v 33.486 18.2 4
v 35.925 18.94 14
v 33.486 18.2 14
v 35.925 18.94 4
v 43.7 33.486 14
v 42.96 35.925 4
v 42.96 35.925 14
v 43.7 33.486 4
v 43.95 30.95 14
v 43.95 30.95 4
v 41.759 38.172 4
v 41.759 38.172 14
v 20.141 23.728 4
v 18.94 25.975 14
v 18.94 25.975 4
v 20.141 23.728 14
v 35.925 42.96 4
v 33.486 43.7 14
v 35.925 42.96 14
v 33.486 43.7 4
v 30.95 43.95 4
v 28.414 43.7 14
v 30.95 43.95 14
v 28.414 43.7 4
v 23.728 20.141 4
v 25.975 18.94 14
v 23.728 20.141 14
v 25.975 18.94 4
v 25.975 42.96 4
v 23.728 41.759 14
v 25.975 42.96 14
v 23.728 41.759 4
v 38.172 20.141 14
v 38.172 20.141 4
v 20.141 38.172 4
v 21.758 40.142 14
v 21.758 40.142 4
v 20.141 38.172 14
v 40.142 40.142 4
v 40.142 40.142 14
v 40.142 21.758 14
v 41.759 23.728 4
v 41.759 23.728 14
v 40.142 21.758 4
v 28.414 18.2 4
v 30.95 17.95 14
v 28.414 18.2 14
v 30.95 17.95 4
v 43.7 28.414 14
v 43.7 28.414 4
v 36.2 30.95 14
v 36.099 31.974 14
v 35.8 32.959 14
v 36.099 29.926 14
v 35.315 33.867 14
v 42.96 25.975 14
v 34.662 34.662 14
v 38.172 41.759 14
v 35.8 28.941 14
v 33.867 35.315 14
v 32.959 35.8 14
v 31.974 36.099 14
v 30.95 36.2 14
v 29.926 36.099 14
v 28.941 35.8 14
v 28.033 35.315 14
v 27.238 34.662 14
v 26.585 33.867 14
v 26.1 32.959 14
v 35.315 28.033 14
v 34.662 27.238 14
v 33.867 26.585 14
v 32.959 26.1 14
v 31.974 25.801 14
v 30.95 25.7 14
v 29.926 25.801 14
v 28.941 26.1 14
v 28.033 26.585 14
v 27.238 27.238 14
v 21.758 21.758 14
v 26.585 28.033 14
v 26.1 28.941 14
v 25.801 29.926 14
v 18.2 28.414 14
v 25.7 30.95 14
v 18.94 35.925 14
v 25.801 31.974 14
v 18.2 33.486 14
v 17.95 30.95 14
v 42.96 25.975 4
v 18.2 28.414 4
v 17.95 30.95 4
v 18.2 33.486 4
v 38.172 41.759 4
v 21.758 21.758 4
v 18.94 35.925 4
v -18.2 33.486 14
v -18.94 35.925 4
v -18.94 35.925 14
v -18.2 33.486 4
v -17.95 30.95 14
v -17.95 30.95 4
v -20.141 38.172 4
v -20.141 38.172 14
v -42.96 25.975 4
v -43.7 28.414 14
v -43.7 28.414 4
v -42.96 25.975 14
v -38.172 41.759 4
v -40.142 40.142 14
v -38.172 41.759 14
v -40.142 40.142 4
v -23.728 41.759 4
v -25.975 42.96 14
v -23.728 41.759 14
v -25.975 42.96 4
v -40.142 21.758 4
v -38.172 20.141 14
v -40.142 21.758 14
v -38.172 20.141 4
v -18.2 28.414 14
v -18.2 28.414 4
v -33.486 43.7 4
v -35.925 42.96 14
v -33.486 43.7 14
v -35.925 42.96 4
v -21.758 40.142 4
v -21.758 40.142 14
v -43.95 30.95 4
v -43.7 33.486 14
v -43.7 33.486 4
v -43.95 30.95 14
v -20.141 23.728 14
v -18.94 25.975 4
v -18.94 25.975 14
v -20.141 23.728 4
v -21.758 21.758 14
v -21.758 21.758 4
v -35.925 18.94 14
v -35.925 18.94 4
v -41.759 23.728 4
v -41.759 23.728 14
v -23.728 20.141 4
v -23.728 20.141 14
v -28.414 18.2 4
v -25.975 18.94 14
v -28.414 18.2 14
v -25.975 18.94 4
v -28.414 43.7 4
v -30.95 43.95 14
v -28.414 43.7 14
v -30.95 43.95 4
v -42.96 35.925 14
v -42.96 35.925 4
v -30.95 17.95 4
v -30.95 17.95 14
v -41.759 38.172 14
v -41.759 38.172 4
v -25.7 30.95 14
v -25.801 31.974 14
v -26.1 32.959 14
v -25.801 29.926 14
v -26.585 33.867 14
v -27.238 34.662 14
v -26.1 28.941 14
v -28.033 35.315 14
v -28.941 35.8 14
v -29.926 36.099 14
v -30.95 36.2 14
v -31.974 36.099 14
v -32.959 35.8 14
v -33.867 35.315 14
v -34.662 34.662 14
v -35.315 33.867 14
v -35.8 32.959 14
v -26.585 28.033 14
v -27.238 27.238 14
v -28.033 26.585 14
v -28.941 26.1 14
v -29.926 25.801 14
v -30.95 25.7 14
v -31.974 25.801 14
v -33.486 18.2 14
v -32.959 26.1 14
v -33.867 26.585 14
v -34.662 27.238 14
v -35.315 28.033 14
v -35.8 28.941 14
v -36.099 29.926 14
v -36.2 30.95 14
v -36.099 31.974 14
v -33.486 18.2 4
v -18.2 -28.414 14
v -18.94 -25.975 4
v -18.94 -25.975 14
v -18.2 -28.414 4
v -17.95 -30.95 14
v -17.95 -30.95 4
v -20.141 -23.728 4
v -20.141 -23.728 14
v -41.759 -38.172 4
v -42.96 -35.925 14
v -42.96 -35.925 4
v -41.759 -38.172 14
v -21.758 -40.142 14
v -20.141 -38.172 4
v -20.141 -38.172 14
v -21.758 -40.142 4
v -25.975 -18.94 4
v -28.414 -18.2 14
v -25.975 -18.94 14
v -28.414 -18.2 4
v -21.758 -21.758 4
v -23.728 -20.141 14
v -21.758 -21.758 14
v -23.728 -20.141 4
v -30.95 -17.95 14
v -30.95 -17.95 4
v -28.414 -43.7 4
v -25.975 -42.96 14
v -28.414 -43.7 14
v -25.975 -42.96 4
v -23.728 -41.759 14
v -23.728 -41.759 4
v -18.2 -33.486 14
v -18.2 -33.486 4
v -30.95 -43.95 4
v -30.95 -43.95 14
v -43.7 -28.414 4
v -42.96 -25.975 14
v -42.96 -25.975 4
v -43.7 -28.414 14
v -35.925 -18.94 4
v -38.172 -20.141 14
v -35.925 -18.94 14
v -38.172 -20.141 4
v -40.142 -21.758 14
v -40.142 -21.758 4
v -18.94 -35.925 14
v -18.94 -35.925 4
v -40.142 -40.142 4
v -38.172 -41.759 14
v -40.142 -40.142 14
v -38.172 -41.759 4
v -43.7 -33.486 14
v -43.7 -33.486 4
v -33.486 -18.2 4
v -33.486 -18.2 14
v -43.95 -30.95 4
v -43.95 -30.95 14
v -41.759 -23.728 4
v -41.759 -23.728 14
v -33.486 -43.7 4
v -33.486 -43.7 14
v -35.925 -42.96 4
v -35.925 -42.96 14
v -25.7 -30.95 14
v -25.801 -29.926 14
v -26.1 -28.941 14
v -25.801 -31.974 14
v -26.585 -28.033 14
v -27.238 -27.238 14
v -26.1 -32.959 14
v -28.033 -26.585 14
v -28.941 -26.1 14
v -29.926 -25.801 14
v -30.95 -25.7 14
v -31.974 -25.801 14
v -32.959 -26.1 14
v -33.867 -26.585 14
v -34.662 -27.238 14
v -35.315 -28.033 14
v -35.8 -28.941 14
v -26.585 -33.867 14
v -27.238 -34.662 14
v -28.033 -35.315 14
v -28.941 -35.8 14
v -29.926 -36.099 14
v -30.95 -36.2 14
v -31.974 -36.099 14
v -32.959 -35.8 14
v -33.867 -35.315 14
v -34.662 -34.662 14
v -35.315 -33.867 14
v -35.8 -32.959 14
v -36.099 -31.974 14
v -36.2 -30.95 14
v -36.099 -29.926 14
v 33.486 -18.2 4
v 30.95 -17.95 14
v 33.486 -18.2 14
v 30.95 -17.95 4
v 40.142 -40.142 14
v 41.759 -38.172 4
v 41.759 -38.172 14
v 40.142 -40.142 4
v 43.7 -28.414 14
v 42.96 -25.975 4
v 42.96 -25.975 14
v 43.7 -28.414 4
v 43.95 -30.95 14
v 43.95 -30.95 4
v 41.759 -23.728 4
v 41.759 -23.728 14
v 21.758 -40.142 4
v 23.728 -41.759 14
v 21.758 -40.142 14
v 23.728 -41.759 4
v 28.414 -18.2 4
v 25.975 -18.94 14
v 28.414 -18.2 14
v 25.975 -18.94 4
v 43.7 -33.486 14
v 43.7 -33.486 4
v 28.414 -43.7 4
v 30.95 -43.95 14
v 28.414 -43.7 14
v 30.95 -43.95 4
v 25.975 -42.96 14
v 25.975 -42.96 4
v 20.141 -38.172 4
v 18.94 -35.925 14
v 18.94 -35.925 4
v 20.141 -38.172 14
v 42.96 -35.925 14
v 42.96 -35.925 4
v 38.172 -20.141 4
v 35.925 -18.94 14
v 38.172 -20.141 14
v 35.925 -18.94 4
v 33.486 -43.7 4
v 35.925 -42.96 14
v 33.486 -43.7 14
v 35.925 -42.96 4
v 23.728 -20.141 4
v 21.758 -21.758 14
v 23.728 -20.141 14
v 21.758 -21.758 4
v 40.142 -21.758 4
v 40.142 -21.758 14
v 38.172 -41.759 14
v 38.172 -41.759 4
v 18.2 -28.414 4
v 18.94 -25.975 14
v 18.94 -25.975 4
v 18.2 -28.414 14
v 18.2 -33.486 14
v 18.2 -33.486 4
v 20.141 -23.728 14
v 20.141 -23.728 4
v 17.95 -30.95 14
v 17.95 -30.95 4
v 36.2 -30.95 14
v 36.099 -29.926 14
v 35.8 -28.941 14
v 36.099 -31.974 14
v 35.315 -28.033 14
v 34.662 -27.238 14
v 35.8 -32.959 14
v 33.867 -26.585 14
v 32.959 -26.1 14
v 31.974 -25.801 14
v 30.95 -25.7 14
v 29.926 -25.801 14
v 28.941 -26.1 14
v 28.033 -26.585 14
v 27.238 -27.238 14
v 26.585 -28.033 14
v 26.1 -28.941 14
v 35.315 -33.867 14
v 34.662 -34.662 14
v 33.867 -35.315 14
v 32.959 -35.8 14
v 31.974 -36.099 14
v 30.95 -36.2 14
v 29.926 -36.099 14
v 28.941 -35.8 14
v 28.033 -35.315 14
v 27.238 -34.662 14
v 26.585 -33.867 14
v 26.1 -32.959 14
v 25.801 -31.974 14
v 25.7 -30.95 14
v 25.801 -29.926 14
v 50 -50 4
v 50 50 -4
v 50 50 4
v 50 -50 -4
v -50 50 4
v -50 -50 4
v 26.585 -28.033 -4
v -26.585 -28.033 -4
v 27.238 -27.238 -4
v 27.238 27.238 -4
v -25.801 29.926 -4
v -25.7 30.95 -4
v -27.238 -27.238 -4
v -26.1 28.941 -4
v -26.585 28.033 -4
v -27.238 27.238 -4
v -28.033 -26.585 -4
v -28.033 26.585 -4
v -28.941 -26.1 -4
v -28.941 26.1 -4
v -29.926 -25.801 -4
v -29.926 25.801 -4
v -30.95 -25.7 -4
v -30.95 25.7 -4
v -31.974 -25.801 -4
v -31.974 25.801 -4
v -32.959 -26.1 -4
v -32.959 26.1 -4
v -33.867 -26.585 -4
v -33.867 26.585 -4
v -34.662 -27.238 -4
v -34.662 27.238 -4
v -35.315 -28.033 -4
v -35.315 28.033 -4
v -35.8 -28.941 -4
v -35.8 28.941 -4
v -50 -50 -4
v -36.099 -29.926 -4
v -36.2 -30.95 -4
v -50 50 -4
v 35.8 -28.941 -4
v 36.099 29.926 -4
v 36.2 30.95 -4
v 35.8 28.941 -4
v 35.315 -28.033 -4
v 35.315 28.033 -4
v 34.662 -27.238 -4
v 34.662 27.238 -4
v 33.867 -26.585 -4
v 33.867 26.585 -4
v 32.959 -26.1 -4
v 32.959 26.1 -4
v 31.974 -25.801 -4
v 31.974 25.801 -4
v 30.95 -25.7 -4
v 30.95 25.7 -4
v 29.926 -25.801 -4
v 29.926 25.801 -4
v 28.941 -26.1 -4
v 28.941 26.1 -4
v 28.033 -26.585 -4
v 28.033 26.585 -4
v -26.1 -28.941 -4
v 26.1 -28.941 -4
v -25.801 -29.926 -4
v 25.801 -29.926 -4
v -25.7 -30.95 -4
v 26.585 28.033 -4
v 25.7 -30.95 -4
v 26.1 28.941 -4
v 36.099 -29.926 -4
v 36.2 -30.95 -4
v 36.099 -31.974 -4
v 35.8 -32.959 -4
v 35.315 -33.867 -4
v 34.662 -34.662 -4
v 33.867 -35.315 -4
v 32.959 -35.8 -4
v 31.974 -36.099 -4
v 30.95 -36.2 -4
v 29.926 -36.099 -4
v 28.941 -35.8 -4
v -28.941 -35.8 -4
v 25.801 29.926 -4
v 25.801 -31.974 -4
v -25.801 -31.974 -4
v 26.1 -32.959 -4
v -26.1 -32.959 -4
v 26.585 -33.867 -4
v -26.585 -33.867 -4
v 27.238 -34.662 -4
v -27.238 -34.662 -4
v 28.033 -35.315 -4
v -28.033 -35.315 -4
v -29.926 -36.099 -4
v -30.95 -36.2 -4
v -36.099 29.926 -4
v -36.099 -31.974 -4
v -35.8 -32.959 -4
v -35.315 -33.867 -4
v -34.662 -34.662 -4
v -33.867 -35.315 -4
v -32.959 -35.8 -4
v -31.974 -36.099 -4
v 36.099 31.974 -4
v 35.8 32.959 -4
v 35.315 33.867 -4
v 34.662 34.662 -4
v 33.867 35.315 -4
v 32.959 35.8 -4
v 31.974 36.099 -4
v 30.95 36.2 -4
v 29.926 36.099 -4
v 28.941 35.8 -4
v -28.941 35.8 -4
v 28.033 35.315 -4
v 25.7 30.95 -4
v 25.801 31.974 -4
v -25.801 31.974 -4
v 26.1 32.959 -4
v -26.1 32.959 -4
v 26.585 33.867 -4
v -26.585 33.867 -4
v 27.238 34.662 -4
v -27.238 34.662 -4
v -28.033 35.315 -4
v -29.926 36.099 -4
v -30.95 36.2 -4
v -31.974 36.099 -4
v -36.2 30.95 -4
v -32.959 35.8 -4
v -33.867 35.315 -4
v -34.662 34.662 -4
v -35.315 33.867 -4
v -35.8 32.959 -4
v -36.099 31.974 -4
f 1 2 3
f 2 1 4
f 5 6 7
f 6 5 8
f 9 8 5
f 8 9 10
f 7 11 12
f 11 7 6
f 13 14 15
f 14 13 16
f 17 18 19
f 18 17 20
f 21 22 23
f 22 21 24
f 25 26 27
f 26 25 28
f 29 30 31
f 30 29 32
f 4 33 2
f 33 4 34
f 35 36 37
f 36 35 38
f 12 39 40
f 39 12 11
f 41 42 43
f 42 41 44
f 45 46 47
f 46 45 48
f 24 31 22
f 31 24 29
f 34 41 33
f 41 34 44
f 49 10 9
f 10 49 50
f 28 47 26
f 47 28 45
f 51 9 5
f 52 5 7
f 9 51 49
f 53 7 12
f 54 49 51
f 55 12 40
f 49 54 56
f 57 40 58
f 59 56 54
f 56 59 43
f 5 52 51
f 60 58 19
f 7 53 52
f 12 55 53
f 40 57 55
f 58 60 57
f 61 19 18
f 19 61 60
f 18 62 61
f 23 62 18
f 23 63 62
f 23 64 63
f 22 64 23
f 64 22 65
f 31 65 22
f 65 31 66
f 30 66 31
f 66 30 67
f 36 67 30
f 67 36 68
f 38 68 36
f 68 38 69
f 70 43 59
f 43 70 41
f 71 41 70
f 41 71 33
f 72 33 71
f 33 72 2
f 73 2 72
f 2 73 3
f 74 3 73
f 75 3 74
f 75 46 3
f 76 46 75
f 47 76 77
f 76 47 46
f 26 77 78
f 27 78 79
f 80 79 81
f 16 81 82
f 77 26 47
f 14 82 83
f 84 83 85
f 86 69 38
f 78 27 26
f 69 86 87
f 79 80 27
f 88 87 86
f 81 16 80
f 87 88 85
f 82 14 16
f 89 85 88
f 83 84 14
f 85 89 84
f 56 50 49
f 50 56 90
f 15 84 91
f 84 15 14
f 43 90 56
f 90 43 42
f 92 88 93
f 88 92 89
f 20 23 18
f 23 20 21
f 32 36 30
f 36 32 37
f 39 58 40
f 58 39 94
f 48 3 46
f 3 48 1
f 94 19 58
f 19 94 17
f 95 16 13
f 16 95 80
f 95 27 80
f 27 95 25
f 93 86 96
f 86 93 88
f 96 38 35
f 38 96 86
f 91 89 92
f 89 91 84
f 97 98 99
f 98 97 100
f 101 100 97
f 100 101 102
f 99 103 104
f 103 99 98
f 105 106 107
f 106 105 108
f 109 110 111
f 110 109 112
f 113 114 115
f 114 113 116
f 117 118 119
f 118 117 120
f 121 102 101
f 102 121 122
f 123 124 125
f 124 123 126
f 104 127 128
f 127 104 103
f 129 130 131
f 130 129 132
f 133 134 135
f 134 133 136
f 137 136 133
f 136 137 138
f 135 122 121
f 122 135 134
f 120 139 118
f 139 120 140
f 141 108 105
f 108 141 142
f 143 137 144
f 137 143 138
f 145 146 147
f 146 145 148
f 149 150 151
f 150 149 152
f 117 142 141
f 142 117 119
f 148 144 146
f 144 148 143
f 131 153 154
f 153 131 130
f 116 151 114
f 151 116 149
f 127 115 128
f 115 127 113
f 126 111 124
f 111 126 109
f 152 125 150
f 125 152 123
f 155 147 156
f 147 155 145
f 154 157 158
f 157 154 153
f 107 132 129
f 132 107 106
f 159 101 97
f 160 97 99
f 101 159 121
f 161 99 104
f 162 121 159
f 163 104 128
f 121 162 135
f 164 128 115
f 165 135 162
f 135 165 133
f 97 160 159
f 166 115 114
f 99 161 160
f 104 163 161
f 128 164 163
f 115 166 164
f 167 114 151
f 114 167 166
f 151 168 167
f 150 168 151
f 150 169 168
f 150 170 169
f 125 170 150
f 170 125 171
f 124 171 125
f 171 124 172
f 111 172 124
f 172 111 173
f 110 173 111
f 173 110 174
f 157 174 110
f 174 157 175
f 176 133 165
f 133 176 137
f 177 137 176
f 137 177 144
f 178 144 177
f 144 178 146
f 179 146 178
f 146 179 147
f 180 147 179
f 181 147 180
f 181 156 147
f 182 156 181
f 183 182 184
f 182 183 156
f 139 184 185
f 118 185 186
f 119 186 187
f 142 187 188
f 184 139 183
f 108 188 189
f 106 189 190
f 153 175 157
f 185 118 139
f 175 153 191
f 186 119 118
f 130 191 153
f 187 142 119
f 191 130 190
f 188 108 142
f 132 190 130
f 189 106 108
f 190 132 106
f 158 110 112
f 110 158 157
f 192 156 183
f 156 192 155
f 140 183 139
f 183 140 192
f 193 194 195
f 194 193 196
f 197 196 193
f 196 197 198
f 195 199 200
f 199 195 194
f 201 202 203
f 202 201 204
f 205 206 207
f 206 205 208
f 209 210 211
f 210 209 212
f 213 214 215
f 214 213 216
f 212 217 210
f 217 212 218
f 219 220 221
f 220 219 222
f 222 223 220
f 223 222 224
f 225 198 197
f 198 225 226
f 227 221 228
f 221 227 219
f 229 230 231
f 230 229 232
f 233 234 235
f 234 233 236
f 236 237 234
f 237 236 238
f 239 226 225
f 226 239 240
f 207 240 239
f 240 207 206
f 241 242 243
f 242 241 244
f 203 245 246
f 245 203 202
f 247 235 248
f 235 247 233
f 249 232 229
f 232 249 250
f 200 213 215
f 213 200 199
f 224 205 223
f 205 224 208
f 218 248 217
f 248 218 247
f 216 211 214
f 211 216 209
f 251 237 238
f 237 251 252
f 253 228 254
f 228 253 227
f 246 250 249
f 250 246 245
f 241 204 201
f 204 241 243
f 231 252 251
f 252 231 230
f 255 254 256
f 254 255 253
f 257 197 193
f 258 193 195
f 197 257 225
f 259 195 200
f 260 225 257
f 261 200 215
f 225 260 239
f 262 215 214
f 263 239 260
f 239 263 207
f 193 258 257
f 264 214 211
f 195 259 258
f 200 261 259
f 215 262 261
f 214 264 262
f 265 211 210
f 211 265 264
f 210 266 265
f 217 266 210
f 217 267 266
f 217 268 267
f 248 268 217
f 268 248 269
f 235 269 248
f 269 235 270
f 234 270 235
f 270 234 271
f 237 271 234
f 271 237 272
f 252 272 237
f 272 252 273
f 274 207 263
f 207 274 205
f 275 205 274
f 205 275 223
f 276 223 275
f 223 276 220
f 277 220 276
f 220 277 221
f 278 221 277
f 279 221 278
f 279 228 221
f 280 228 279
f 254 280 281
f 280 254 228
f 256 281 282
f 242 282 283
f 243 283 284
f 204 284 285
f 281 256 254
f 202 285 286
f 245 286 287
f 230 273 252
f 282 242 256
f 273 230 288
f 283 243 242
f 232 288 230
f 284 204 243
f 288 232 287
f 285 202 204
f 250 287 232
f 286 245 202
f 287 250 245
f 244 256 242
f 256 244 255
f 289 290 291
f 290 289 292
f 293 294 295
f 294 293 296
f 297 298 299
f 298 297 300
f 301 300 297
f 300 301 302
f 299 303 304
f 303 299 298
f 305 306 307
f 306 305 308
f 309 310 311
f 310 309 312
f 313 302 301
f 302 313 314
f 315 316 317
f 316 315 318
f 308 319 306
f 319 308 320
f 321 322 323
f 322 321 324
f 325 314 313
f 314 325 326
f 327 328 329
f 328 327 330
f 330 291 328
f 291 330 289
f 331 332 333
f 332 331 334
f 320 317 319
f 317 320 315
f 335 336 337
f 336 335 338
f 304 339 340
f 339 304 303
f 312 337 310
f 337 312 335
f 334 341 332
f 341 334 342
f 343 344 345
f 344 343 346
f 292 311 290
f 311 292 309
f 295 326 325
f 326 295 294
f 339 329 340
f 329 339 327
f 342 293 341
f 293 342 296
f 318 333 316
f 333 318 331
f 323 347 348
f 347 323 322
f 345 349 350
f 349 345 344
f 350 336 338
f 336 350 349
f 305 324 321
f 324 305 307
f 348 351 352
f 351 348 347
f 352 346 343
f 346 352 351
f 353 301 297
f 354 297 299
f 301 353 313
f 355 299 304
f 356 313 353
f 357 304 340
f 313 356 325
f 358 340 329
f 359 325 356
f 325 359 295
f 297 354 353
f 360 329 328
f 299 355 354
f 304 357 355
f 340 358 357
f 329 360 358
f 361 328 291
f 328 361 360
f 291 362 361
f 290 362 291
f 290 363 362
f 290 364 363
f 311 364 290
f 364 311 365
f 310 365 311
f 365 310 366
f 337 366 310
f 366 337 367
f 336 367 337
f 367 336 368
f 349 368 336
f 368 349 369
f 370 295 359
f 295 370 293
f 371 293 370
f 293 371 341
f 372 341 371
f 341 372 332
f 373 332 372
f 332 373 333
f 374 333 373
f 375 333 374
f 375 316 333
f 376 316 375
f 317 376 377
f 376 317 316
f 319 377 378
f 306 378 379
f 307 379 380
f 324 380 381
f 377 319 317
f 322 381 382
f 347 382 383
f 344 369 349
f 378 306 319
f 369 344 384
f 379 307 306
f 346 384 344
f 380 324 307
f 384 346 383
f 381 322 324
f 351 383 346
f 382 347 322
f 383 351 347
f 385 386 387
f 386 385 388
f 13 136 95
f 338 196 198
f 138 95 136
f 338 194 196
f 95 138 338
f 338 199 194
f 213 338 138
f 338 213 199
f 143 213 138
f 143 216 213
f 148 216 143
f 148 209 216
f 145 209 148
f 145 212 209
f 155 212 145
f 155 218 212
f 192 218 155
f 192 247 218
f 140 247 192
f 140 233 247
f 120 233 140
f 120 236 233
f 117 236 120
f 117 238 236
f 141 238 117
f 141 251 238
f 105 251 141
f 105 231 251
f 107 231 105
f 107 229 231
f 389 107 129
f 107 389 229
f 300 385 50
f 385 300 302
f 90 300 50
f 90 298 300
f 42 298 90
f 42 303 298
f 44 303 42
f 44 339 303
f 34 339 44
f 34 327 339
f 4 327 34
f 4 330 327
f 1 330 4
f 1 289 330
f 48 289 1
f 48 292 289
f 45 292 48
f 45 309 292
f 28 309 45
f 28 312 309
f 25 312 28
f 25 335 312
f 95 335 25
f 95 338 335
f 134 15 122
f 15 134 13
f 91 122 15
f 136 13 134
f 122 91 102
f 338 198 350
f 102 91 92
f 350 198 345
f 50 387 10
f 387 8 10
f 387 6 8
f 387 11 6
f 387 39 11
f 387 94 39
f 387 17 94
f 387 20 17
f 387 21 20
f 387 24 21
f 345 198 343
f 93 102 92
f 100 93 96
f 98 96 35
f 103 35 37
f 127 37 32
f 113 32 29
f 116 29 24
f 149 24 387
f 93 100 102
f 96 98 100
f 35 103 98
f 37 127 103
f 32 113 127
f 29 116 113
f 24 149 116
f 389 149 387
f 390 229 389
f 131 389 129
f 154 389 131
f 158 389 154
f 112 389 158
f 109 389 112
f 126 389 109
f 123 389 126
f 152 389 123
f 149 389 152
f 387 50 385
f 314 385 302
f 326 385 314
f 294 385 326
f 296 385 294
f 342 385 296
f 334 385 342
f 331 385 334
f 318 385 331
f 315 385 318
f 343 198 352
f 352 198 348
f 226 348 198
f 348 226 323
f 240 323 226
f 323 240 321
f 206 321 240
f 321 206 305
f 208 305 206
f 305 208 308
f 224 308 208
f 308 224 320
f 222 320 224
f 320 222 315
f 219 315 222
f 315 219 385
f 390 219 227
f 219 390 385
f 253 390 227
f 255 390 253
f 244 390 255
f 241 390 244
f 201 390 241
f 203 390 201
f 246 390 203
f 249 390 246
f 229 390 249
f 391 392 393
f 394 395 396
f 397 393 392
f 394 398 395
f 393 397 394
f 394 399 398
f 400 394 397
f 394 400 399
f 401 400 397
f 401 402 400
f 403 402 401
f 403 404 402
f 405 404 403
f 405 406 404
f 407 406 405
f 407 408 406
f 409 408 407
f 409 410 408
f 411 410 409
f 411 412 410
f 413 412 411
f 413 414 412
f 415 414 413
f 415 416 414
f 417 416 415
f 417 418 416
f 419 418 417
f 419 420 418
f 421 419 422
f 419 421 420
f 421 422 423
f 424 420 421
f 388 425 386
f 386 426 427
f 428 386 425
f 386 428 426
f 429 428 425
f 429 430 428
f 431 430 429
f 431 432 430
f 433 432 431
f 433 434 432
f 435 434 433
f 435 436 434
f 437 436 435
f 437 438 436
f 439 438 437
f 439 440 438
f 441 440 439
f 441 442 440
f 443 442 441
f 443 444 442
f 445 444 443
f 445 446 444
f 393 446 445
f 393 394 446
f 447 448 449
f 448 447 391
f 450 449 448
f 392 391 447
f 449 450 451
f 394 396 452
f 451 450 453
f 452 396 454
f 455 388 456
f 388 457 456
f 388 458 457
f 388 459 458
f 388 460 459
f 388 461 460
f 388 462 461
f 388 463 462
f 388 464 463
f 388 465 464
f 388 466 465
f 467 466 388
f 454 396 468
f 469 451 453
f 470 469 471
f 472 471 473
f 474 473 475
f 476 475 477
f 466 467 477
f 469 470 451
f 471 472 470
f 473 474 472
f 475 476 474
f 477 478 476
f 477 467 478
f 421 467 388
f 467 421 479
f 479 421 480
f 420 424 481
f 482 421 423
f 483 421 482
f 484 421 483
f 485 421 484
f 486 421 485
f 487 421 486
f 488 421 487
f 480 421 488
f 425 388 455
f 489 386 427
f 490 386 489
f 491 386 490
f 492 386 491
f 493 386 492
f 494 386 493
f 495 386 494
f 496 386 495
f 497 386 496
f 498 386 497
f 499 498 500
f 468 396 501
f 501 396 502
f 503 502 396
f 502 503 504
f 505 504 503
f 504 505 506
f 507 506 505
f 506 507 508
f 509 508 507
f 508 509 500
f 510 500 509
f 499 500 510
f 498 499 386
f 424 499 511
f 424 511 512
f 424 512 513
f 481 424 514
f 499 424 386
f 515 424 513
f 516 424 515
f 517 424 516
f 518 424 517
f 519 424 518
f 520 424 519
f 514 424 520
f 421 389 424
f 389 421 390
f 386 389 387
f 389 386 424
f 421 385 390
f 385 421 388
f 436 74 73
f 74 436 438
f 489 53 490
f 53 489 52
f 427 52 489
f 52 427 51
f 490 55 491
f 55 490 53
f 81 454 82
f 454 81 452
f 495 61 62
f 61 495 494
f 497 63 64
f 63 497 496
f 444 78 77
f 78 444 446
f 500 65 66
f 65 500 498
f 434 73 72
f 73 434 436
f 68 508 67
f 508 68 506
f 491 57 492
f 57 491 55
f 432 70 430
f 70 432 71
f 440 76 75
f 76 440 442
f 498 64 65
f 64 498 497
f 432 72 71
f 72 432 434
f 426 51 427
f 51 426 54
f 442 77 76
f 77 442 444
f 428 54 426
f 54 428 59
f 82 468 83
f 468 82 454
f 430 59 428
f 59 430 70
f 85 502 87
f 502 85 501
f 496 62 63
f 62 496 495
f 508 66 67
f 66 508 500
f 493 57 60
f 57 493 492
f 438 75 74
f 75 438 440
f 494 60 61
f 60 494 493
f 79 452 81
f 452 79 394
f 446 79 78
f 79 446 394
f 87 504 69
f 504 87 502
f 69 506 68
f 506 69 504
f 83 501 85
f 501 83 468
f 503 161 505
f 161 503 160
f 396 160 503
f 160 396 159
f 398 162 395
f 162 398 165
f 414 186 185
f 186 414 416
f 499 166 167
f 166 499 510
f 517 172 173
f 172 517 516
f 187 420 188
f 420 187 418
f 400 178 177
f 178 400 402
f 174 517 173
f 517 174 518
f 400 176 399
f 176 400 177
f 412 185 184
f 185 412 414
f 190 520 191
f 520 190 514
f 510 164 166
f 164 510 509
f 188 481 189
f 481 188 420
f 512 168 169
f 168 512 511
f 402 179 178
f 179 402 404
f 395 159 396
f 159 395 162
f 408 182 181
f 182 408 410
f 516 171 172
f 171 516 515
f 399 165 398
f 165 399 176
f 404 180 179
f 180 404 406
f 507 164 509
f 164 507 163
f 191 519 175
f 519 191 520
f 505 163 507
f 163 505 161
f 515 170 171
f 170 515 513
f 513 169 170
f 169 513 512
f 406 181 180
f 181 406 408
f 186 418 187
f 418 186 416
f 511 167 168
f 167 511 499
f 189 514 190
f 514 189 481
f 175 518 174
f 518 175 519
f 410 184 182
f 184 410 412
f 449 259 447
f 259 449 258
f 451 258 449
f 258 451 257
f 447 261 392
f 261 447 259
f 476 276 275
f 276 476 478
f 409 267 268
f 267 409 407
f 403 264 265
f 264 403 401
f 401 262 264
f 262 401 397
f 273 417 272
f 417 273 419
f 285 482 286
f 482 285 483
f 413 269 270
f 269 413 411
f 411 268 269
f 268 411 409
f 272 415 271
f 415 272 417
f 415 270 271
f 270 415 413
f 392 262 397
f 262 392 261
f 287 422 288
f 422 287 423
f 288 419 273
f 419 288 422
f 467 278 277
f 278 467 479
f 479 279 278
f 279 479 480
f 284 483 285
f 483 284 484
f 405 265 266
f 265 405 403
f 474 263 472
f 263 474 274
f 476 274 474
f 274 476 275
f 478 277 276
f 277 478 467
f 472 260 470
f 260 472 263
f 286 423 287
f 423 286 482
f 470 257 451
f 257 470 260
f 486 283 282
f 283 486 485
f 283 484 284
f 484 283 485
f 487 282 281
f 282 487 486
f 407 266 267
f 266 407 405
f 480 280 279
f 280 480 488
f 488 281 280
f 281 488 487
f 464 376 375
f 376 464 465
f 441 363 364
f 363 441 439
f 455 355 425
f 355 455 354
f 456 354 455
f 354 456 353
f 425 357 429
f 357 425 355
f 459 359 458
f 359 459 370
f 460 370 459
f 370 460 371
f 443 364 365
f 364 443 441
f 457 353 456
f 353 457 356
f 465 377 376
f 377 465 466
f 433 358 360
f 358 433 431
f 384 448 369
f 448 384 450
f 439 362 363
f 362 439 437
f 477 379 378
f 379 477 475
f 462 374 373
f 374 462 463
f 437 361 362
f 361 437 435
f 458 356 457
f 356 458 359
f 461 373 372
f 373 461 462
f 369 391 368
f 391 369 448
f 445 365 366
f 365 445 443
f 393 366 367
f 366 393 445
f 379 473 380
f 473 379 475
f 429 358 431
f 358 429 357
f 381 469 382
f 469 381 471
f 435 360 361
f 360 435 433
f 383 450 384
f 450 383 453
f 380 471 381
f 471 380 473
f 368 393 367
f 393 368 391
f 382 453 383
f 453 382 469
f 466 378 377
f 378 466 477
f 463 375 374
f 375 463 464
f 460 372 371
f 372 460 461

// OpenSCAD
$fn = 32;

// ----------------------------------------------------------------------
// Anchor pads 100 x 100 x 18
// four corner bosses with anchor holes
// ----------------------------------------------------------------------

// --- parameters (mm) ---
plate = [100, 100, 8];  // base plate size (x, y, z)
pads = 4;               // boss count, one per corner
edge = 19.05;           // boss centre offset from the plate edge
boss_d = 26;            // boss diameter
boss_h = 10;            // boss height above the base plate
hole_d = 10.5;          // hole diameter

// --- derived feature positions (mm) ---
height = plate[2] + boss_h;      // = 18   overall height of the part
corner_x = plate[0] / 2 - edge;  // = 30.95   boss centre X
corner_y = plate[1] / 2 - edge;  // = 30.95   boss centre Y
feature_centers = [
  [corner_x, corner_y],
  [-corner_x, corner_y],
  [-corner_x, -corner_y],
  [corner_x, -corner_y]
];   // boss centres, anchor holes are drilled there

// base plate, four bosses standing on it, anchor holes all the way through
difference() {
  union() {
    cube(plate, center = true);
    for (centre = feature_centers)
      translate([centre[0], centre[1], plate[2] / 2 - 1])
        cylinder(d = boss_d, h = boss_h + 1);
  }
  for (centre = feature_centers)
    translate([centre[0], centre[1], -height])
      cylinder(d = hole_d, h = 2 * height + 2);  // through boss and plate
}
